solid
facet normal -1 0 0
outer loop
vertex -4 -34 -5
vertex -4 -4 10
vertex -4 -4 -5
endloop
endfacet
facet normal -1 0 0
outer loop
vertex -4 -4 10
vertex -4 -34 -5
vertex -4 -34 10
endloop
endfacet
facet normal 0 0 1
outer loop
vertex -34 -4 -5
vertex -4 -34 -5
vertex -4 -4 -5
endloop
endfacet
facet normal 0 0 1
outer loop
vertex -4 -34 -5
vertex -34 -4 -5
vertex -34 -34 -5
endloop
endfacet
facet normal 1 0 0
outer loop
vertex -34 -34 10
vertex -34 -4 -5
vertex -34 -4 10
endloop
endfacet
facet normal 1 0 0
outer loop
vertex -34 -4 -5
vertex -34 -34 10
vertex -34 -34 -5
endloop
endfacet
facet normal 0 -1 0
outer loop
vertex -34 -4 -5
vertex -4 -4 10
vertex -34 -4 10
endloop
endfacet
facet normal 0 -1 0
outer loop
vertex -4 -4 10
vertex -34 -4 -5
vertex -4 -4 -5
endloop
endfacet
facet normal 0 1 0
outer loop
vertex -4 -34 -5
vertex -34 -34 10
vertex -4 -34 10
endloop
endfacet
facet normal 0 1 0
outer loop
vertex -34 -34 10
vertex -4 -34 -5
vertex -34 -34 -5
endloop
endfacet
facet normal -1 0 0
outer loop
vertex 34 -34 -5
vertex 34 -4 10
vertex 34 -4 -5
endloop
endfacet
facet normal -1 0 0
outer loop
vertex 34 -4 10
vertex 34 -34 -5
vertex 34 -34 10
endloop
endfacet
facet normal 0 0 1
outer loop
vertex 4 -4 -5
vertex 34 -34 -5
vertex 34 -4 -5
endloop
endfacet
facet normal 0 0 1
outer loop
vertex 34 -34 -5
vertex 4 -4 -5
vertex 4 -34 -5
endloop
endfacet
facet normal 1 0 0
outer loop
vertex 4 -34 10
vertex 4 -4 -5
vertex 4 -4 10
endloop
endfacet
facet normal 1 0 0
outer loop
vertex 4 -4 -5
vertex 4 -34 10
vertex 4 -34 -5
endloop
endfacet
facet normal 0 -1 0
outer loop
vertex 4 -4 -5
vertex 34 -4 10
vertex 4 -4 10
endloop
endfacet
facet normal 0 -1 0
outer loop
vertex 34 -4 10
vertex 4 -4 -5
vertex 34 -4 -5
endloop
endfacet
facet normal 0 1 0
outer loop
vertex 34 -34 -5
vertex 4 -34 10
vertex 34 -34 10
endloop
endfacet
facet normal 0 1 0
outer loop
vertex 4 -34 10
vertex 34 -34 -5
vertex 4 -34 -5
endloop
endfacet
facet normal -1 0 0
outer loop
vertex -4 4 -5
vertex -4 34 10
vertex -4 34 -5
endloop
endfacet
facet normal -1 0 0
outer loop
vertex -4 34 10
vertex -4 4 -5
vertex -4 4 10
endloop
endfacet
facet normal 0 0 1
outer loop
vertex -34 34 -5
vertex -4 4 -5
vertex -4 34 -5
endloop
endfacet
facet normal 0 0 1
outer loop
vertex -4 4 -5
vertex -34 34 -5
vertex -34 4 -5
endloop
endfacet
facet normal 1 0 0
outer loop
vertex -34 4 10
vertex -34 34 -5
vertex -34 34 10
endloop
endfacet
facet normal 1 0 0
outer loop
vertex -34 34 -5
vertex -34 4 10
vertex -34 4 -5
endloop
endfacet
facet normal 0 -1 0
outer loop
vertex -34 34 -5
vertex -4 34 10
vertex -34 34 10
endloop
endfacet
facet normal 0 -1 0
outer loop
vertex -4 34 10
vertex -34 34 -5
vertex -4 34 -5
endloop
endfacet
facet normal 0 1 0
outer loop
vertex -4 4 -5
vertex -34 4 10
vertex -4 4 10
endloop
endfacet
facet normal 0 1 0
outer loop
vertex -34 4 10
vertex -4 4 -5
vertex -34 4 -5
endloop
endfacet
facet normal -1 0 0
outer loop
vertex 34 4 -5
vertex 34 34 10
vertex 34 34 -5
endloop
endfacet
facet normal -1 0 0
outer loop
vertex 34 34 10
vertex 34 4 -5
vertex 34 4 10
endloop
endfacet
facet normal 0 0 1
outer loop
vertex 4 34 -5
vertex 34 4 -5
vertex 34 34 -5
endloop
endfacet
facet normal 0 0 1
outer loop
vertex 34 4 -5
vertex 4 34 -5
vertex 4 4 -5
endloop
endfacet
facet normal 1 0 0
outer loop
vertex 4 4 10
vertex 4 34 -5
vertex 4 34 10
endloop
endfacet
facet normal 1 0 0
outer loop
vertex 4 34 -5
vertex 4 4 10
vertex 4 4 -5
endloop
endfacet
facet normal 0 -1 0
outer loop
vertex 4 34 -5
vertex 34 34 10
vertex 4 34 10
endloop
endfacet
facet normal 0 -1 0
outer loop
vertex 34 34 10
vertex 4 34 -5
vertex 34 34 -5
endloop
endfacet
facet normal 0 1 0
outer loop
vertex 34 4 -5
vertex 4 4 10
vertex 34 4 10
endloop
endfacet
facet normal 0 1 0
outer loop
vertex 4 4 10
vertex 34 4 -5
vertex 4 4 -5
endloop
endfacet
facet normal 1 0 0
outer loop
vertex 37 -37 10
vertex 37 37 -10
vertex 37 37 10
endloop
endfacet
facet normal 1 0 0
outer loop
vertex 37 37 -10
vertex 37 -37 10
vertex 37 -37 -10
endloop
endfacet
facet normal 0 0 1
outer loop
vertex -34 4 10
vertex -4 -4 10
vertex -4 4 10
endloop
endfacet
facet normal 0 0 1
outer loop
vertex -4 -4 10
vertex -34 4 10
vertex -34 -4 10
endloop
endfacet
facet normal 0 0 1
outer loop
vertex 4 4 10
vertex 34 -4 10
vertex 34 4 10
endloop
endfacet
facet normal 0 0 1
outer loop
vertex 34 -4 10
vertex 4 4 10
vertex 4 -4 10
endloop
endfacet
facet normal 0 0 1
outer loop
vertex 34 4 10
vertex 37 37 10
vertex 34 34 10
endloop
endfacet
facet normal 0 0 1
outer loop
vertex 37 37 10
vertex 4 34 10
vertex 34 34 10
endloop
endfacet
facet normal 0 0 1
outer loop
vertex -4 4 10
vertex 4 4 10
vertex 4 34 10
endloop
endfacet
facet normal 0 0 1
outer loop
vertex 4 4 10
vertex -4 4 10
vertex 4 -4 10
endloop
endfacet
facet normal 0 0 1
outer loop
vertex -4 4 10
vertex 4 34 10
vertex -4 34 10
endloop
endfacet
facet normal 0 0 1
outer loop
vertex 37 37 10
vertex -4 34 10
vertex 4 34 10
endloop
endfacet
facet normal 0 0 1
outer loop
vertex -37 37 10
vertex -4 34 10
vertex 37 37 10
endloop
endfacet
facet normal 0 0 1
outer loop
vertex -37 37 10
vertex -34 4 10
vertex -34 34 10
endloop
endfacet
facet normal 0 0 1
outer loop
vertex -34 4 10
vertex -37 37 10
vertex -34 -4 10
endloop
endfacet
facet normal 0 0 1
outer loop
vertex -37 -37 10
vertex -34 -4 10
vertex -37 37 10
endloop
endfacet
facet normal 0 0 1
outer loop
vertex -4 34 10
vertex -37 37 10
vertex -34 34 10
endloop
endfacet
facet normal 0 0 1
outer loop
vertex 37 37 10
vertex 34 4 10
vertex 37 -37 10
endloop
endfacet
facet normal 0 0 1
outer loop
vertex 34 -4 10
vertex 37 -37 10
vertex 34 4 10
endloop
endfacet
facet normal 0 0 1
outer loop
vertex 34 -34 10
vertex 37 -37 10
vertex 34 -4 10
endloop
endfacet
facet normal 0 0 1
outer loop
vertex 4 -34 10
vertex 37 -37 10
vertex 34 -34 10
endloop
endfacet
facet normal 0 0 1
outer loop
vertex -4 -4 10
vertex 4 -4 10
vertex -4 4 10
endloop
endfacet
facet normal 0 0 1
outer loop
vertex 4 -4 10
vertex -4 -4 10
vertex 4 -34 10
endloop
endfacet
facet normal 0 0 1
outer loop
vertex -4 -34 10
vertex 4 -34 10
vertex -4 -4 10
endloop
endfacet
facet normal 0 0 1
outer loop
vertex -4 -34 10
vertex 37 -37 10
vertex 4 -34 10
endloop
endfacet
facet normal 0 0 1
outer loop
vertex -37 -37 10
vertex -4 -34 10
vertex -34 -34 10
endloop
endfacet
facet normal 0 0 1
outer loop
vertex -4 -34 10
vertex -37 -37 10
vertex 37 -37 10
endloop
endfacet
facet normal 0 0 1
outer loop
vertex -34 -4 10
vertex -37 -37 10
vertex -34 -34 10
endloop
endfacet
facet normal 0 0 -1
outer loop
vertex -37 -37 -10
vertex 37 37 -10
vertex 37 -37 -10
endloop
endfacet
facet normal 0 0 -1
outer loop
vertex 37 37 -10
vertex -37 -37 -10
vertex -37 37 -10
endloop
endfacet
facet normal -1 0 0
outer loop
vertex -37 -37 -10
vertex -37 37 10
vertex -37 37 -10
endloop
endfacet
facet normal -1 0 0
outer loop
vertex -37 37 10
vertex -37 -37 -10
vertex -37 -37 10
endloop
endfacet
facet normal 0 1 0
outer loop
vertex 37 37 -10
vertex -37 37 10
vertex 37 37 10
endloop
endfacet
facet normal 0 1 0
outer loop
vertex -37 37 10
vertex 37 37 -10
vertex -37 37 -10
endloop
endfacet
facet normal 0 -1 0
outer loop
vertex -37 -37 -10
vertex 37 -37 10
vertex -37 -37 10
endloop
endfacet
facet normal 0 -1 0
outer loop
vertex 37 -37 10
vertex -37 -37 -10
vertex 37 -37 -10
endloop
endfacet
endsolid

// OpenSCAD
$fn = 32;

// ----------------------------------------------------------------------
// Pocket plate 74 x 74 x 20
// 2 x 2 pockets 30 mm square, 15 mm deep
// ----------------------------------------------------------------------

// --- parameters (mm) ---
thickness = 20;  // plate thickness
floor_t = 5;     // material left under each pocket
pocket = 30;     // pocket side length
pitch_x = 38;    // pocket pitch along X
pitch_y = 38;    // pocket pitch along Y
cols = 2;        // pockets per row
rows = 2;        // rows of pockets

// --- derived feature positions (mm) ---
depth = thickness - floor_t;        // = 15   pocket depth, down to the floor
span_x = (cols - 1) * pitch_x;      // = 38   distance between outer pockets
span_y = (rows - 1) * pitch_y;      // = 38   distance between outer pocket rows
origin_x = -span_x / 2;             // = -19   X of the first pocket
origin_y = -span_y / 2;             // = -19   Y of the first pocket
plate = [span_x + pocket + 6, span_y + pocket + 6, thickness];  // = [74, 74, 20]   overall size: pockets plus 3 mm of wall on each side
feature_centers = [
  [origin_x + 0 * pitch_x, origin_y + 0 * pitch_y],
  [origin_x + 1 * pitch_x, origin_y + 0 * pitch_y],
  [origin_x + 0 * pitch_x, origin_y + 1 * pitch_y],
  [origin_x + 1 * pitch_x, origin_y + 1 * pitch_y]
];   // pocket centres, used verbatim by the cutter loop

// plate outline, then one pocket per centre in feature_centers
difference() {
  cube(plate, center = true);
  for (centre = feature_centers)
    translate([centre[0] - pocket / 2, centre[1] - pocket / 2, plate[2] / 2 - depth])
      cube([pocket, pocket, depth + 1]);  // centred on the declared pocket centre
}
